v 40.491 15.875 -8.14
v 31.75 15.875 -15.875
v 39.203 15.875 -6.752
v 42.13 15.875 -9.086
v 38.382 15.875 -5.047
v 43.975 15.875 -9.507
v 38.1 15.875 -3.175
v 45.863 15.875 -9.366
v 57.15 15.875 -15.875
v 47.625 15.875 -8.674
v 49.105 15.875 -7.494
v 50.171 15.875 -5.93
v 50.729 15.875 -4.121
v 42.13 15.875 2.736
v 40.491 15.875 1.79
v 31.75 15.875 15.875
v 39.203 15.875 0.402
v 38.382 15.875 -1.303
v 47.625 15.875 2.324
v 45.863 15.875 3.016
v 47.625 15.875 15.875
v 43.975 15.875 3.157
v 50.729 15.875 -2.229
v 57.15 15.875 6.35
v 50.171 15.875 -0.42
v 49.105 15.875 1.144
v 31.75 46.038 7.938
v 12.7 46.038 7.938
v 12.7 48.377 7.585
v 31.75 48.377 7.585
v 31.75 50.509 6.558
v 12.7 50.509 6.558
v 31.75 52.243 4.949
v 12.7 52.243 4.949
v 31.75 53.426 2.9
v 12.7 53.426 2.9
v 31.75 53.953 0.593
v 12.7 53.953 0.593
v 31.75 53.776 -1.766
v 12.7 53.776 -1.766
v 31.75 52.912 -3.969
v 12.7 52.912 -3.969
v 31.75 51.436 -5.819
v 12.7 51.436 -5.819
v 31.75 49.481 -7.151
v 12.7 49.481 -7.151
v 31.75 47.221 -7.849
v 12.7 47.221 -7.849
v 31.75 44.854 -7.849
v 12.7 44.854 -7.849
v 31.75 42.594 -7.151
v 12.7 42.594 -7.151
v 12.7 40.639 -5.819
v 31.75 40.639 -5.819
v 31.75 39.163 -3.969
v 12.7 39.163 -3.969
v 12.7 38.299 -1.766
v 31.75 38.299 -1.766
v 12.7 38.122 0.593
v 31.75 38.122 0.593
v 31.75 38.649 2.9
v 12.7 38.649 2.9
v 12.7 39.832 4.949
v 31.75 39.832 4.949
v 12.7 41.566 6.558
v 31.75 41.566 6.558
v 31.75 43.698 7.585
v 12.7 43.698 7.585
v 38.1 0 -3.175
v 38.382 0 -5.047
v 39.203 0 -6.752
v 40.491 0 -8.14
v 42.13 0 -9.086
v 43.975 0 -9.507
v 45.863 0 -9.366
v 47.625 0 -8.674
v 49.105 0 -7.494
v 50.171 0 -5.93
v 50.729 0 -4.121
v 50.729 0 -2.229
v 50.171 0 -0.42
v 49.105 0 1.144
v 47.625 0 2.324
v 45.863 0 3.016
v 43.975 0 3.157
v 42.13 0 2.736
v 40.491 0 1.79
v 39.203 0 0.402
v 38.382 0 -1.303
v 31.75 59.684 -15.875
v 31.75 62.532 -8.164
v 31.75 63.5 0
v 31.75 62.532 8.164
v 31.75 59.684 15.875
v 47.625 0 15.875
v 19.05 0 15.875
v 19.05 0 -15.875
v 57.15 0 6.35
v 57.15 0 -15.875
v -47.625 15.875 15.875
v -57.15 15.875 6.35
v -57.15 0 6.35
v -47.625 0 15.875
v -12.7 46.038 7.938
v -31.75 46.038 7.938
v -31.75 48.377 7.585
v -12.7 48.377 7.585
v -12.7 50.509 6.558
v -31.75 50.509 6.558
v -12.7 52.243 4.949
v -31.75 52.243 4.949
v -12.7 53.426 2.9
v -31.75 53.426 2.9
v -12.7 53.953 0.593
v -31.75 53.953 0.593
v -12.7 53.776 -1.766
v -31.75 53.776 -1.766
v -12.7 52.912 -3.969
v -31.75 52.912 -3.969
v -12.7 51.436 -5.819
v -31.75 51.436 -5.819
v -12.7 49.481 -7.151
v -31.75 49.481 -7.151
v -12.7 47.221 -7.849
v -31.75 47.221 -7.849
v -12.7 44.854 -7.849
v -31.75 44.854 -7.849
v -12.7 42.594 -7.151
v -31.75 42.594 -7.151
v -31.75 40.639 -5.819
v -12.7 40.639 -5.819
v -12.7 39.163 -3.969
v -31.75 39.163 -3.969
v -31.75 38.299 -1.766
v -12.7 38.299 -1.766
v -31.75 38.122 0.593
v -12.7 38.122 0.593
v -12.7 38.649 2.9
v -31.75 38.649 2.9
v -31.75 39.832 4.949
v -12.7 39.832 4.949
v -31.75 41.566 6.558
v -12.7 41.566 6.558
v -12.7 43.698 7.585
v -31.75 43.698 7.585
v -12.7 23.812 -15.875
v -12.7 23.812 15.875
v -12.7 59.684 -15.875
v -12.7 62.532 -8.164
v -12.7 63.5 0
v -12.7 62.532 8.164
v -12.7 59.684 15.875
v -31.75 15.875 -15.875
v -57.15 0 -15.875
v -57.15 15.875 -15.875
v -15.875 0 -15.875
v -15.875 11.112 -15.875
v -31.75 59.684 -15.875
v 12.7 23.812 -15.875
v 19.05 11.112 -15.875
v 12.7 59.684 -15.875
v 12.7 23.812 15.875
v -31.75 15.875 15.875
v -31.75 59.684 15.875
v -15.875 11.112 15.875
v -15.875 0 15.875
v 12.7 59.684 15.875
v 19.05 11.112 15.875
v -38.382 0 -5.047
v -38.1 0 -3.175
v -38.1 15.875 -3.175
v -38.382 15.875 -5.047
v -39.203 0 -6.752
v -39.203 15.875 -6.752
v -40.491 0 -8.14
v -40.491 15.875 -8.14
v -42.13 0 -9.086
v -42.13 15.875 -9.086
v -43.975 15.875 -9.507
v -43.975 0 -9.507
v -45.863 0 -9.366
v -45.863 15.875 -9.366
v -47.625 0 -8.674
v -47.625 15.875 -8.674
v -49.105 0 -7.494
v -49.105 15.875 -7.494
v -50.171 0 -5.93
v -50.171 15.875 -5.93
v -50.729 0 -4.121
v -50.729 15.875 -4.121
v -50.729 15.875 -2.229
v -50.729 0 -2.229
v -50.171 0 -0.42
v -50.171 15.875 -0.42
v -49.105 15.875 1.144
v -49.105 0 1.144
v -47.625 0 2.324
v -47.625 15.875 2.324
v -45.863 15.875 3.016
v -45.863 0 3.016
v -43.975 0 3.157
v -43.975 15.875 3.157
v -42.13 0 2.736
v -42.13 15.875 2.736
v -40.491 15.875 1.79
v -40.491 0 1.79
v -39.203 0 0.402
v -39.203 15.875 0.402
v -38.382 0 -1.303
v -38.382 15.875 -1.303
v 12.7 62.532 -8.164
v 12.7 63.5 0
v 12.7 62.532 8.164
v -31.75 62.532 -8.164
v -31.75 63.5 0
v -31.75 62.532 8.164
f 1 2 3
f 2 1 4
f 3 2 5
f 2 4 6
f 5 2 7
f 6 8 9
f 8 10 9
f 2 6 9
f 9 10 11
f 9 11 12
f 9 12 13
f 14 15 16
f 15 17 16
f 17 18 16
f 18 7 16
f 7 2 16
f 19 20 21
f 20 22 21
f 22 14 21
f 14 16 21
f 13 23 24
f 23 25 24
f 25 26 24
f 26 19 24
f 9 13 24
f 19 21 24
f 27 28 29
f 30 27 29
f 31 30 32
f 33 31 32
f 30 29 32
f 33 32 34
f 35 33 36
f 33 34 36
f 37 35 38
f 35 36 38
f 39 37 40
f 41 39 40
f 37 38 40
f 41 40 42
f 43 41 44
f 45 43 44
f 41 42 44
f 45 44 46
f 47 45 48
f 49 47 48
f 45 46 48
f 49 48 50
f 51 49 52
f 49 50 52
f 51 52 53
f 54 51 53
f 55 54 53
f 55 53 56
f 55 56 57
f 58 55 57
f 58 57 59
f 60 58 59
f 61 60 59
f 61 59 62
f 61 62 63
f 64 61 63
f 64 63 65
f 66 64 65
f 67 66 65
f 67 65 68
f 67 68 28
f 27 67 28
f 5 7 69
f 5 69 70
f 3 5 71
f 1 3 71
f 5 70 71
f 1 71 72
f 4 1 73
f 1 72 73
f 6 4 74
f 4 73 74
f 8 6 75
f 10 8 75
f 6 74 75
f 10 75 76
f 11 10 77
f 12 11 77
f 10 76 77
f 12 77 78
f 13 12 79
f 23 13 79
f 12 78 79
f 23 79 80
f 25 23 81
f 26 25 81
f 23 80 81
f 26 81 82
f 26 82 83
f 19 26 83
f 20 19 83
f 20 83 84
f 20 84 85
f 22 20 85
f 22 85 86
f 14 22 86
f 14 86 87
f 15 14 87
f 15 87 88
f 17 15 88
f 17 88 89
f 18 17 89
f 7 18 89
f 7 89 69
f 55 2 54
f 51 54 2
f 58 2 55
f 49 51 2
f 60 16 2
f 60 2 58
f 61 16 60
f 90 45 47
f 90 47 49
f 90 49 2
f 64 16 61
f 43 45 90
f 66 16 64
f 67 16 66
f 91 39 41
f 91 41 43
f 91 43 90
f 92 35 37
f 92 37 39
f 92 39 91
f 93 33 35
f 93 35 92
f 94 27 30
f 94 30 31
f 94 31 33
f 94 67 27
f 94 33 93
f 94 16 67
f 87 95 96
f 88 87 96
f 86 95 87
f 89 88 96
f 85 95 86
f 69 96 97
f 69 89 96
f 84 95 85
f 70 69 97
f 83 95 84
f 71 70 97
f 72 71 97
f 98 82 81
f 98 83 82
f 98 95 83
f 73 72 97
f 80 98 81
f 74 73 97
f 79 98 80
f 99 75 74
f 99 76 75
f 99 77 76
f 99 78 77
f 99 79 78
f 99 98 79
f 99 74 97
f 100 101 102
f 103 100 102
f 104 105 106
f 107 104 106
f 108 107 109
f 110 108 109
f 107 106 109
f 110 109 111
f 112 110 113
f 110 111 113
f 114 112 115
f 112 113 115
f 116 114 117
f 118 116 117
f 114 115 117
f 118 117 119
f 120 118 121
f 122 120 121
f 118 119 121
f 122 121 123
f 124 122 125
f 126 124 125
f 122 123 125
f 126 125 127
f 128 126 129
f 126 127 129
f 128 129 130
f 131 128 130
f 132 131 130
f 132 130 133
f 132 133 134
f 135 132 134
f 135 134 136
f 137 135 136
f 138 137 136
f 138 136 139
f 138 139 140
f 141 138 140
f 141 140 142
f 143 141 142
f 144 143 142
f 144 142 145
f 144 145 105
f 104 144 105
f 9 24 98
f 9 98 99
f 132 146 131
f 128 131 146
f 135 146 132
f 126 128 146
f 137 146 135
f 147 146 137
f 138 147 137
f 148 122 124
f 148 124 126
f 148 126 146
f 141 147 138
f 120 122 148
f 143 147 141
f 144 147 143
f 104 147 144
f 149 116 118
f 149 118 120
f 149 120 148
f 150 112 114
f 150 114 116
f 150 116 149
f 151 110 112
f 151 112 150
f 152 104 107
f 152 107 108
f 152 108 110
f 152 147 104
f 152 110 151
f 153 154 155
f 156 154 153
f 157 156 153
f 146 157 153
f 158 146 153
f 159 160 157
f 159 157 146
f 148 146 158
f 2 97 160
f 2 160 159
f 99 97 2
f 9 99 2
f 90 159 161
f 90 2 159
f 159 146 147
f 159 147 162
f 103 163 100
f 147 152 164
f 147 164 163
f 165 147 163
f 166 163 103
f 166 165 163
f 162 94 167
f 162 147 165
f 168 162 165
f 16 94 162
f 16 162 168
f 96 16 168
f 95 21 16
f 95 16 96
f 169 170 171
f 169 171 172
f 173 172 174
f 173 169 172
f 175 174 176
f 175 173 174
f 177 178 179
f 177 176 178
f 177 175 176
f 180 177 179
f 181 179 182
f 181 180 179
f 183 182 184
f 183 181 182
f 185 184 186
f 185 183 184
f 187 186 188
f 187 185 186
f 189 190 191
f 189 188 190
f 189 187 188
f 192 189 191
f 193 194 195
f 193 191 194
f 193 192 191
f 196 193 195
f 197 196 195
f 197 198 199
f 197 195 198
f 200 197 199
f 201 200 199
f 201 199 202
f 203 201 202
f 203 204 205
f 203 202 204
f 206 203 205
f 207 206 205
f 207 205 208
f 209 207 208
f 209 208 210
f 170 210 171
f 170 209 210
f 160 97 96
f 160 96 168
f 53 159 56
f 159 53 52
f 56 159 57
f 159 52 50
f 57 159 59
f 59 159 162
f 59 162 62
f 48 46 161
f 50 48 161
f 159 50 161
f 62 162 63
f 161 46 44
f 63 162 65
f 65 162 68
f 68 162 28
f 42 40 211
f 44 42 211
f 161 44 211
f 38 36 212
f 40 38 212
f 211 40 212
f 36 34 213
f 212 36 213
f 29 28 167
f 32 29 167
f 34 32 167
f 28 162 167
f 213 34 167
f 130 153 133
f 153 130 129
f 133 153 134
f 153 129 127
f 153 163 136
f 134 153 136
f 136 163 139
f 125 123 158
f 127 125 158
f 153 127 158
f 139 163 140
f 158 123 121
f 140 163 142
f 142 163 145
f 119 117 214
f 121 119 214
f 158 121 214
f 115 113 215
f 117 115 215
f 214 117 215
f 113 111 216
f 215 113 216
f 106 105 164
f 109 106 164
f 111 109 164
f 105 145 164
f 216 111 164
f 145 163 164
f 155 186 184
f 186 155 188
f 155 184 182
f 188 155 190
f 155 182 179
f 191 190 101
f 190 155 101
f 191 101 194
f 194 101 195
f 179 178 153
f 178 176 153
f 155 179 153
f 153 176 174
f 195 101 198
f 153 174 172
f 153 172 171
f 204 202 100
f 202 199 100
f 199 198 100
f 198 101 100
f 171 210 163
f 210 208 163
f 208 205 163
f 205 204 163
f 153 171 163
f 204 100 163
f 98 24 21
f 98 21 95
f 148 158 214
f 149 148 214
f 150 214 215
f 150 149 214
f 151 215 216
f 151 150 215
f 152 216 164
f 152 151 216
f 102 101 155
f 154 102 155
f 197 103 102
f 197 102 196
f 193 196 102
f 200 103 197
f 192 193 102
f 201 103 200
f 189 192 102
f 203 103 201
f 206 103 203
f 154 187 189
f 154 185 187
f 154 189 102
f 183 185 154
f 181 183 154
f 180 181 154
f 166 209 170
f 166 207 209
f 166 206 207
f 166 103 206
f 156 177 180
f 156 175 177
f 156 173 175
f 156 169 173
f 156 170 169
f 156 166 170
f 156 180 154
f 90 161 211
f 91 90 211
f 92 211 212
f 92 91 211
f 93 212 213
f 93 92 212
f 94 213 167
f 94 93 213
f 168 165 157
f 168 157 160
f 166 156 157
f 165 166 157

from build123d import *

# Parameters (mm, degrees)
BOSS_EXTRU_1_DEPTH                = 57.15
ESQUISSE2_W                       = 25.4
ESQUISSE2_H                       = 47.625
ESQUISSE2_H_2                     = 39.6875
ESQUISSE2_W_2                     = 34.925
ESQUISSE2_H_3                     = 11.1125
ENL_V_MAT_EXTRU_1_DEPTH           = 92.139645599
CHANFREIN1_SIZE                   = 9.525
DIAM_TRE_DU_PER_AGE_5_8_0_625_2_D = 15.875
DIAM_TRE_DU_PER_AGE_1_2_0_5_1_D   = 12.7


with BuildPart() as part:
    # Esquisse1 → Boss.-Extru.1 (new, symmetric)
    with BuildSketch(Plane(origin=(0, 0, 0), x_dir=(0, 0, -1), z_dir=(1, 0, 0))):
        with BuildLine():
            Line((-15.875, 59.683519733), (-15.875, 0))
            Line((-15.875, 0), (15.875, 0))
            Line((15.875, 0), (15.875, 59.683519733))
            ThreePointArc((15.875, 59.683519733), (0, 63.5), (-15.875, 59.683519733))
        make_face()
    extrude(amount=BOSS_EXTRU_1_DEPTH, both=True)

    # Esquisse2 → Enlèv. mat.-Extru.1 (cut, through all)
    with BuildSketch(Plane.XY.offset(15.875)):
        with Locations((44.45, 39.6875)):
            Rectangle(ESQUISSE2_W, ESQUISSE2_H)
        with Locations((-44.45, 39.6875)):
            Rectangle(ESQUISSE2_W, ESQUISSE2_H)
        with Locations((0, 43.65625)):
            Rectangle(ESQUISSE2_W, ESQUISSE2_H_2)
        with Locations((1.5875, 5.55625)):
            Rectangle(ESQUISSE2_W_2, ESQUISSE2_H_3)
    extrude(amount=-ENL_V_MAT_EXTRU_1_DEPTH, mode=Mode.SUBTRACT)

    # Chanfrein1
    chanfrein1_edges = [part.edges().sort_by_distance(p)[0] for p in [
        (-57.15, 7.9375, 15.875),
        (57.15, 7.9375, 15.875),
    ]]
    chamfer(chanfrein1_edges, length=CHANFREIN1_SIZE)

    # Diamètre du perçage 5/8 (0.625)2 (through all)
    with Locations(Plane(origin=(31.75, 0, 0), x_dir=(0, 0, -1), z_dir=(1, 0, 0))):
        with Locations((0, 46.0375)):
            Hole(DIAM_TRE_DU_PER_AGE_5_8_0_625_2_D / 2)

    # Diamètre du perçage 1/2 (0.5)1 (through all)
    with Locations(Plane(origin=(0, 15.875, 0), x_dir=(1, 0, 0), z_dir=(0, 1, 0))):
        with Locations((44.45, 3.175)):
            diam_tre_du_per_age_1_2_0_5_1 = Hole(DIAM_TRE_DU_PER_AGE_1_2_0_5_1_D / 2)

    # Symétrie1: Diamètre du perçage 1/2 (0.5)1 across plane
    add(diam_tre_du_per_age_1_2_0_5_1.mirror(Plane(origin=(0, 0, 0), x_dir=(0, 0, 1), z_dir=(1, 0, 0))), mode=Mode.SUBTRACT)


solid = part.part
